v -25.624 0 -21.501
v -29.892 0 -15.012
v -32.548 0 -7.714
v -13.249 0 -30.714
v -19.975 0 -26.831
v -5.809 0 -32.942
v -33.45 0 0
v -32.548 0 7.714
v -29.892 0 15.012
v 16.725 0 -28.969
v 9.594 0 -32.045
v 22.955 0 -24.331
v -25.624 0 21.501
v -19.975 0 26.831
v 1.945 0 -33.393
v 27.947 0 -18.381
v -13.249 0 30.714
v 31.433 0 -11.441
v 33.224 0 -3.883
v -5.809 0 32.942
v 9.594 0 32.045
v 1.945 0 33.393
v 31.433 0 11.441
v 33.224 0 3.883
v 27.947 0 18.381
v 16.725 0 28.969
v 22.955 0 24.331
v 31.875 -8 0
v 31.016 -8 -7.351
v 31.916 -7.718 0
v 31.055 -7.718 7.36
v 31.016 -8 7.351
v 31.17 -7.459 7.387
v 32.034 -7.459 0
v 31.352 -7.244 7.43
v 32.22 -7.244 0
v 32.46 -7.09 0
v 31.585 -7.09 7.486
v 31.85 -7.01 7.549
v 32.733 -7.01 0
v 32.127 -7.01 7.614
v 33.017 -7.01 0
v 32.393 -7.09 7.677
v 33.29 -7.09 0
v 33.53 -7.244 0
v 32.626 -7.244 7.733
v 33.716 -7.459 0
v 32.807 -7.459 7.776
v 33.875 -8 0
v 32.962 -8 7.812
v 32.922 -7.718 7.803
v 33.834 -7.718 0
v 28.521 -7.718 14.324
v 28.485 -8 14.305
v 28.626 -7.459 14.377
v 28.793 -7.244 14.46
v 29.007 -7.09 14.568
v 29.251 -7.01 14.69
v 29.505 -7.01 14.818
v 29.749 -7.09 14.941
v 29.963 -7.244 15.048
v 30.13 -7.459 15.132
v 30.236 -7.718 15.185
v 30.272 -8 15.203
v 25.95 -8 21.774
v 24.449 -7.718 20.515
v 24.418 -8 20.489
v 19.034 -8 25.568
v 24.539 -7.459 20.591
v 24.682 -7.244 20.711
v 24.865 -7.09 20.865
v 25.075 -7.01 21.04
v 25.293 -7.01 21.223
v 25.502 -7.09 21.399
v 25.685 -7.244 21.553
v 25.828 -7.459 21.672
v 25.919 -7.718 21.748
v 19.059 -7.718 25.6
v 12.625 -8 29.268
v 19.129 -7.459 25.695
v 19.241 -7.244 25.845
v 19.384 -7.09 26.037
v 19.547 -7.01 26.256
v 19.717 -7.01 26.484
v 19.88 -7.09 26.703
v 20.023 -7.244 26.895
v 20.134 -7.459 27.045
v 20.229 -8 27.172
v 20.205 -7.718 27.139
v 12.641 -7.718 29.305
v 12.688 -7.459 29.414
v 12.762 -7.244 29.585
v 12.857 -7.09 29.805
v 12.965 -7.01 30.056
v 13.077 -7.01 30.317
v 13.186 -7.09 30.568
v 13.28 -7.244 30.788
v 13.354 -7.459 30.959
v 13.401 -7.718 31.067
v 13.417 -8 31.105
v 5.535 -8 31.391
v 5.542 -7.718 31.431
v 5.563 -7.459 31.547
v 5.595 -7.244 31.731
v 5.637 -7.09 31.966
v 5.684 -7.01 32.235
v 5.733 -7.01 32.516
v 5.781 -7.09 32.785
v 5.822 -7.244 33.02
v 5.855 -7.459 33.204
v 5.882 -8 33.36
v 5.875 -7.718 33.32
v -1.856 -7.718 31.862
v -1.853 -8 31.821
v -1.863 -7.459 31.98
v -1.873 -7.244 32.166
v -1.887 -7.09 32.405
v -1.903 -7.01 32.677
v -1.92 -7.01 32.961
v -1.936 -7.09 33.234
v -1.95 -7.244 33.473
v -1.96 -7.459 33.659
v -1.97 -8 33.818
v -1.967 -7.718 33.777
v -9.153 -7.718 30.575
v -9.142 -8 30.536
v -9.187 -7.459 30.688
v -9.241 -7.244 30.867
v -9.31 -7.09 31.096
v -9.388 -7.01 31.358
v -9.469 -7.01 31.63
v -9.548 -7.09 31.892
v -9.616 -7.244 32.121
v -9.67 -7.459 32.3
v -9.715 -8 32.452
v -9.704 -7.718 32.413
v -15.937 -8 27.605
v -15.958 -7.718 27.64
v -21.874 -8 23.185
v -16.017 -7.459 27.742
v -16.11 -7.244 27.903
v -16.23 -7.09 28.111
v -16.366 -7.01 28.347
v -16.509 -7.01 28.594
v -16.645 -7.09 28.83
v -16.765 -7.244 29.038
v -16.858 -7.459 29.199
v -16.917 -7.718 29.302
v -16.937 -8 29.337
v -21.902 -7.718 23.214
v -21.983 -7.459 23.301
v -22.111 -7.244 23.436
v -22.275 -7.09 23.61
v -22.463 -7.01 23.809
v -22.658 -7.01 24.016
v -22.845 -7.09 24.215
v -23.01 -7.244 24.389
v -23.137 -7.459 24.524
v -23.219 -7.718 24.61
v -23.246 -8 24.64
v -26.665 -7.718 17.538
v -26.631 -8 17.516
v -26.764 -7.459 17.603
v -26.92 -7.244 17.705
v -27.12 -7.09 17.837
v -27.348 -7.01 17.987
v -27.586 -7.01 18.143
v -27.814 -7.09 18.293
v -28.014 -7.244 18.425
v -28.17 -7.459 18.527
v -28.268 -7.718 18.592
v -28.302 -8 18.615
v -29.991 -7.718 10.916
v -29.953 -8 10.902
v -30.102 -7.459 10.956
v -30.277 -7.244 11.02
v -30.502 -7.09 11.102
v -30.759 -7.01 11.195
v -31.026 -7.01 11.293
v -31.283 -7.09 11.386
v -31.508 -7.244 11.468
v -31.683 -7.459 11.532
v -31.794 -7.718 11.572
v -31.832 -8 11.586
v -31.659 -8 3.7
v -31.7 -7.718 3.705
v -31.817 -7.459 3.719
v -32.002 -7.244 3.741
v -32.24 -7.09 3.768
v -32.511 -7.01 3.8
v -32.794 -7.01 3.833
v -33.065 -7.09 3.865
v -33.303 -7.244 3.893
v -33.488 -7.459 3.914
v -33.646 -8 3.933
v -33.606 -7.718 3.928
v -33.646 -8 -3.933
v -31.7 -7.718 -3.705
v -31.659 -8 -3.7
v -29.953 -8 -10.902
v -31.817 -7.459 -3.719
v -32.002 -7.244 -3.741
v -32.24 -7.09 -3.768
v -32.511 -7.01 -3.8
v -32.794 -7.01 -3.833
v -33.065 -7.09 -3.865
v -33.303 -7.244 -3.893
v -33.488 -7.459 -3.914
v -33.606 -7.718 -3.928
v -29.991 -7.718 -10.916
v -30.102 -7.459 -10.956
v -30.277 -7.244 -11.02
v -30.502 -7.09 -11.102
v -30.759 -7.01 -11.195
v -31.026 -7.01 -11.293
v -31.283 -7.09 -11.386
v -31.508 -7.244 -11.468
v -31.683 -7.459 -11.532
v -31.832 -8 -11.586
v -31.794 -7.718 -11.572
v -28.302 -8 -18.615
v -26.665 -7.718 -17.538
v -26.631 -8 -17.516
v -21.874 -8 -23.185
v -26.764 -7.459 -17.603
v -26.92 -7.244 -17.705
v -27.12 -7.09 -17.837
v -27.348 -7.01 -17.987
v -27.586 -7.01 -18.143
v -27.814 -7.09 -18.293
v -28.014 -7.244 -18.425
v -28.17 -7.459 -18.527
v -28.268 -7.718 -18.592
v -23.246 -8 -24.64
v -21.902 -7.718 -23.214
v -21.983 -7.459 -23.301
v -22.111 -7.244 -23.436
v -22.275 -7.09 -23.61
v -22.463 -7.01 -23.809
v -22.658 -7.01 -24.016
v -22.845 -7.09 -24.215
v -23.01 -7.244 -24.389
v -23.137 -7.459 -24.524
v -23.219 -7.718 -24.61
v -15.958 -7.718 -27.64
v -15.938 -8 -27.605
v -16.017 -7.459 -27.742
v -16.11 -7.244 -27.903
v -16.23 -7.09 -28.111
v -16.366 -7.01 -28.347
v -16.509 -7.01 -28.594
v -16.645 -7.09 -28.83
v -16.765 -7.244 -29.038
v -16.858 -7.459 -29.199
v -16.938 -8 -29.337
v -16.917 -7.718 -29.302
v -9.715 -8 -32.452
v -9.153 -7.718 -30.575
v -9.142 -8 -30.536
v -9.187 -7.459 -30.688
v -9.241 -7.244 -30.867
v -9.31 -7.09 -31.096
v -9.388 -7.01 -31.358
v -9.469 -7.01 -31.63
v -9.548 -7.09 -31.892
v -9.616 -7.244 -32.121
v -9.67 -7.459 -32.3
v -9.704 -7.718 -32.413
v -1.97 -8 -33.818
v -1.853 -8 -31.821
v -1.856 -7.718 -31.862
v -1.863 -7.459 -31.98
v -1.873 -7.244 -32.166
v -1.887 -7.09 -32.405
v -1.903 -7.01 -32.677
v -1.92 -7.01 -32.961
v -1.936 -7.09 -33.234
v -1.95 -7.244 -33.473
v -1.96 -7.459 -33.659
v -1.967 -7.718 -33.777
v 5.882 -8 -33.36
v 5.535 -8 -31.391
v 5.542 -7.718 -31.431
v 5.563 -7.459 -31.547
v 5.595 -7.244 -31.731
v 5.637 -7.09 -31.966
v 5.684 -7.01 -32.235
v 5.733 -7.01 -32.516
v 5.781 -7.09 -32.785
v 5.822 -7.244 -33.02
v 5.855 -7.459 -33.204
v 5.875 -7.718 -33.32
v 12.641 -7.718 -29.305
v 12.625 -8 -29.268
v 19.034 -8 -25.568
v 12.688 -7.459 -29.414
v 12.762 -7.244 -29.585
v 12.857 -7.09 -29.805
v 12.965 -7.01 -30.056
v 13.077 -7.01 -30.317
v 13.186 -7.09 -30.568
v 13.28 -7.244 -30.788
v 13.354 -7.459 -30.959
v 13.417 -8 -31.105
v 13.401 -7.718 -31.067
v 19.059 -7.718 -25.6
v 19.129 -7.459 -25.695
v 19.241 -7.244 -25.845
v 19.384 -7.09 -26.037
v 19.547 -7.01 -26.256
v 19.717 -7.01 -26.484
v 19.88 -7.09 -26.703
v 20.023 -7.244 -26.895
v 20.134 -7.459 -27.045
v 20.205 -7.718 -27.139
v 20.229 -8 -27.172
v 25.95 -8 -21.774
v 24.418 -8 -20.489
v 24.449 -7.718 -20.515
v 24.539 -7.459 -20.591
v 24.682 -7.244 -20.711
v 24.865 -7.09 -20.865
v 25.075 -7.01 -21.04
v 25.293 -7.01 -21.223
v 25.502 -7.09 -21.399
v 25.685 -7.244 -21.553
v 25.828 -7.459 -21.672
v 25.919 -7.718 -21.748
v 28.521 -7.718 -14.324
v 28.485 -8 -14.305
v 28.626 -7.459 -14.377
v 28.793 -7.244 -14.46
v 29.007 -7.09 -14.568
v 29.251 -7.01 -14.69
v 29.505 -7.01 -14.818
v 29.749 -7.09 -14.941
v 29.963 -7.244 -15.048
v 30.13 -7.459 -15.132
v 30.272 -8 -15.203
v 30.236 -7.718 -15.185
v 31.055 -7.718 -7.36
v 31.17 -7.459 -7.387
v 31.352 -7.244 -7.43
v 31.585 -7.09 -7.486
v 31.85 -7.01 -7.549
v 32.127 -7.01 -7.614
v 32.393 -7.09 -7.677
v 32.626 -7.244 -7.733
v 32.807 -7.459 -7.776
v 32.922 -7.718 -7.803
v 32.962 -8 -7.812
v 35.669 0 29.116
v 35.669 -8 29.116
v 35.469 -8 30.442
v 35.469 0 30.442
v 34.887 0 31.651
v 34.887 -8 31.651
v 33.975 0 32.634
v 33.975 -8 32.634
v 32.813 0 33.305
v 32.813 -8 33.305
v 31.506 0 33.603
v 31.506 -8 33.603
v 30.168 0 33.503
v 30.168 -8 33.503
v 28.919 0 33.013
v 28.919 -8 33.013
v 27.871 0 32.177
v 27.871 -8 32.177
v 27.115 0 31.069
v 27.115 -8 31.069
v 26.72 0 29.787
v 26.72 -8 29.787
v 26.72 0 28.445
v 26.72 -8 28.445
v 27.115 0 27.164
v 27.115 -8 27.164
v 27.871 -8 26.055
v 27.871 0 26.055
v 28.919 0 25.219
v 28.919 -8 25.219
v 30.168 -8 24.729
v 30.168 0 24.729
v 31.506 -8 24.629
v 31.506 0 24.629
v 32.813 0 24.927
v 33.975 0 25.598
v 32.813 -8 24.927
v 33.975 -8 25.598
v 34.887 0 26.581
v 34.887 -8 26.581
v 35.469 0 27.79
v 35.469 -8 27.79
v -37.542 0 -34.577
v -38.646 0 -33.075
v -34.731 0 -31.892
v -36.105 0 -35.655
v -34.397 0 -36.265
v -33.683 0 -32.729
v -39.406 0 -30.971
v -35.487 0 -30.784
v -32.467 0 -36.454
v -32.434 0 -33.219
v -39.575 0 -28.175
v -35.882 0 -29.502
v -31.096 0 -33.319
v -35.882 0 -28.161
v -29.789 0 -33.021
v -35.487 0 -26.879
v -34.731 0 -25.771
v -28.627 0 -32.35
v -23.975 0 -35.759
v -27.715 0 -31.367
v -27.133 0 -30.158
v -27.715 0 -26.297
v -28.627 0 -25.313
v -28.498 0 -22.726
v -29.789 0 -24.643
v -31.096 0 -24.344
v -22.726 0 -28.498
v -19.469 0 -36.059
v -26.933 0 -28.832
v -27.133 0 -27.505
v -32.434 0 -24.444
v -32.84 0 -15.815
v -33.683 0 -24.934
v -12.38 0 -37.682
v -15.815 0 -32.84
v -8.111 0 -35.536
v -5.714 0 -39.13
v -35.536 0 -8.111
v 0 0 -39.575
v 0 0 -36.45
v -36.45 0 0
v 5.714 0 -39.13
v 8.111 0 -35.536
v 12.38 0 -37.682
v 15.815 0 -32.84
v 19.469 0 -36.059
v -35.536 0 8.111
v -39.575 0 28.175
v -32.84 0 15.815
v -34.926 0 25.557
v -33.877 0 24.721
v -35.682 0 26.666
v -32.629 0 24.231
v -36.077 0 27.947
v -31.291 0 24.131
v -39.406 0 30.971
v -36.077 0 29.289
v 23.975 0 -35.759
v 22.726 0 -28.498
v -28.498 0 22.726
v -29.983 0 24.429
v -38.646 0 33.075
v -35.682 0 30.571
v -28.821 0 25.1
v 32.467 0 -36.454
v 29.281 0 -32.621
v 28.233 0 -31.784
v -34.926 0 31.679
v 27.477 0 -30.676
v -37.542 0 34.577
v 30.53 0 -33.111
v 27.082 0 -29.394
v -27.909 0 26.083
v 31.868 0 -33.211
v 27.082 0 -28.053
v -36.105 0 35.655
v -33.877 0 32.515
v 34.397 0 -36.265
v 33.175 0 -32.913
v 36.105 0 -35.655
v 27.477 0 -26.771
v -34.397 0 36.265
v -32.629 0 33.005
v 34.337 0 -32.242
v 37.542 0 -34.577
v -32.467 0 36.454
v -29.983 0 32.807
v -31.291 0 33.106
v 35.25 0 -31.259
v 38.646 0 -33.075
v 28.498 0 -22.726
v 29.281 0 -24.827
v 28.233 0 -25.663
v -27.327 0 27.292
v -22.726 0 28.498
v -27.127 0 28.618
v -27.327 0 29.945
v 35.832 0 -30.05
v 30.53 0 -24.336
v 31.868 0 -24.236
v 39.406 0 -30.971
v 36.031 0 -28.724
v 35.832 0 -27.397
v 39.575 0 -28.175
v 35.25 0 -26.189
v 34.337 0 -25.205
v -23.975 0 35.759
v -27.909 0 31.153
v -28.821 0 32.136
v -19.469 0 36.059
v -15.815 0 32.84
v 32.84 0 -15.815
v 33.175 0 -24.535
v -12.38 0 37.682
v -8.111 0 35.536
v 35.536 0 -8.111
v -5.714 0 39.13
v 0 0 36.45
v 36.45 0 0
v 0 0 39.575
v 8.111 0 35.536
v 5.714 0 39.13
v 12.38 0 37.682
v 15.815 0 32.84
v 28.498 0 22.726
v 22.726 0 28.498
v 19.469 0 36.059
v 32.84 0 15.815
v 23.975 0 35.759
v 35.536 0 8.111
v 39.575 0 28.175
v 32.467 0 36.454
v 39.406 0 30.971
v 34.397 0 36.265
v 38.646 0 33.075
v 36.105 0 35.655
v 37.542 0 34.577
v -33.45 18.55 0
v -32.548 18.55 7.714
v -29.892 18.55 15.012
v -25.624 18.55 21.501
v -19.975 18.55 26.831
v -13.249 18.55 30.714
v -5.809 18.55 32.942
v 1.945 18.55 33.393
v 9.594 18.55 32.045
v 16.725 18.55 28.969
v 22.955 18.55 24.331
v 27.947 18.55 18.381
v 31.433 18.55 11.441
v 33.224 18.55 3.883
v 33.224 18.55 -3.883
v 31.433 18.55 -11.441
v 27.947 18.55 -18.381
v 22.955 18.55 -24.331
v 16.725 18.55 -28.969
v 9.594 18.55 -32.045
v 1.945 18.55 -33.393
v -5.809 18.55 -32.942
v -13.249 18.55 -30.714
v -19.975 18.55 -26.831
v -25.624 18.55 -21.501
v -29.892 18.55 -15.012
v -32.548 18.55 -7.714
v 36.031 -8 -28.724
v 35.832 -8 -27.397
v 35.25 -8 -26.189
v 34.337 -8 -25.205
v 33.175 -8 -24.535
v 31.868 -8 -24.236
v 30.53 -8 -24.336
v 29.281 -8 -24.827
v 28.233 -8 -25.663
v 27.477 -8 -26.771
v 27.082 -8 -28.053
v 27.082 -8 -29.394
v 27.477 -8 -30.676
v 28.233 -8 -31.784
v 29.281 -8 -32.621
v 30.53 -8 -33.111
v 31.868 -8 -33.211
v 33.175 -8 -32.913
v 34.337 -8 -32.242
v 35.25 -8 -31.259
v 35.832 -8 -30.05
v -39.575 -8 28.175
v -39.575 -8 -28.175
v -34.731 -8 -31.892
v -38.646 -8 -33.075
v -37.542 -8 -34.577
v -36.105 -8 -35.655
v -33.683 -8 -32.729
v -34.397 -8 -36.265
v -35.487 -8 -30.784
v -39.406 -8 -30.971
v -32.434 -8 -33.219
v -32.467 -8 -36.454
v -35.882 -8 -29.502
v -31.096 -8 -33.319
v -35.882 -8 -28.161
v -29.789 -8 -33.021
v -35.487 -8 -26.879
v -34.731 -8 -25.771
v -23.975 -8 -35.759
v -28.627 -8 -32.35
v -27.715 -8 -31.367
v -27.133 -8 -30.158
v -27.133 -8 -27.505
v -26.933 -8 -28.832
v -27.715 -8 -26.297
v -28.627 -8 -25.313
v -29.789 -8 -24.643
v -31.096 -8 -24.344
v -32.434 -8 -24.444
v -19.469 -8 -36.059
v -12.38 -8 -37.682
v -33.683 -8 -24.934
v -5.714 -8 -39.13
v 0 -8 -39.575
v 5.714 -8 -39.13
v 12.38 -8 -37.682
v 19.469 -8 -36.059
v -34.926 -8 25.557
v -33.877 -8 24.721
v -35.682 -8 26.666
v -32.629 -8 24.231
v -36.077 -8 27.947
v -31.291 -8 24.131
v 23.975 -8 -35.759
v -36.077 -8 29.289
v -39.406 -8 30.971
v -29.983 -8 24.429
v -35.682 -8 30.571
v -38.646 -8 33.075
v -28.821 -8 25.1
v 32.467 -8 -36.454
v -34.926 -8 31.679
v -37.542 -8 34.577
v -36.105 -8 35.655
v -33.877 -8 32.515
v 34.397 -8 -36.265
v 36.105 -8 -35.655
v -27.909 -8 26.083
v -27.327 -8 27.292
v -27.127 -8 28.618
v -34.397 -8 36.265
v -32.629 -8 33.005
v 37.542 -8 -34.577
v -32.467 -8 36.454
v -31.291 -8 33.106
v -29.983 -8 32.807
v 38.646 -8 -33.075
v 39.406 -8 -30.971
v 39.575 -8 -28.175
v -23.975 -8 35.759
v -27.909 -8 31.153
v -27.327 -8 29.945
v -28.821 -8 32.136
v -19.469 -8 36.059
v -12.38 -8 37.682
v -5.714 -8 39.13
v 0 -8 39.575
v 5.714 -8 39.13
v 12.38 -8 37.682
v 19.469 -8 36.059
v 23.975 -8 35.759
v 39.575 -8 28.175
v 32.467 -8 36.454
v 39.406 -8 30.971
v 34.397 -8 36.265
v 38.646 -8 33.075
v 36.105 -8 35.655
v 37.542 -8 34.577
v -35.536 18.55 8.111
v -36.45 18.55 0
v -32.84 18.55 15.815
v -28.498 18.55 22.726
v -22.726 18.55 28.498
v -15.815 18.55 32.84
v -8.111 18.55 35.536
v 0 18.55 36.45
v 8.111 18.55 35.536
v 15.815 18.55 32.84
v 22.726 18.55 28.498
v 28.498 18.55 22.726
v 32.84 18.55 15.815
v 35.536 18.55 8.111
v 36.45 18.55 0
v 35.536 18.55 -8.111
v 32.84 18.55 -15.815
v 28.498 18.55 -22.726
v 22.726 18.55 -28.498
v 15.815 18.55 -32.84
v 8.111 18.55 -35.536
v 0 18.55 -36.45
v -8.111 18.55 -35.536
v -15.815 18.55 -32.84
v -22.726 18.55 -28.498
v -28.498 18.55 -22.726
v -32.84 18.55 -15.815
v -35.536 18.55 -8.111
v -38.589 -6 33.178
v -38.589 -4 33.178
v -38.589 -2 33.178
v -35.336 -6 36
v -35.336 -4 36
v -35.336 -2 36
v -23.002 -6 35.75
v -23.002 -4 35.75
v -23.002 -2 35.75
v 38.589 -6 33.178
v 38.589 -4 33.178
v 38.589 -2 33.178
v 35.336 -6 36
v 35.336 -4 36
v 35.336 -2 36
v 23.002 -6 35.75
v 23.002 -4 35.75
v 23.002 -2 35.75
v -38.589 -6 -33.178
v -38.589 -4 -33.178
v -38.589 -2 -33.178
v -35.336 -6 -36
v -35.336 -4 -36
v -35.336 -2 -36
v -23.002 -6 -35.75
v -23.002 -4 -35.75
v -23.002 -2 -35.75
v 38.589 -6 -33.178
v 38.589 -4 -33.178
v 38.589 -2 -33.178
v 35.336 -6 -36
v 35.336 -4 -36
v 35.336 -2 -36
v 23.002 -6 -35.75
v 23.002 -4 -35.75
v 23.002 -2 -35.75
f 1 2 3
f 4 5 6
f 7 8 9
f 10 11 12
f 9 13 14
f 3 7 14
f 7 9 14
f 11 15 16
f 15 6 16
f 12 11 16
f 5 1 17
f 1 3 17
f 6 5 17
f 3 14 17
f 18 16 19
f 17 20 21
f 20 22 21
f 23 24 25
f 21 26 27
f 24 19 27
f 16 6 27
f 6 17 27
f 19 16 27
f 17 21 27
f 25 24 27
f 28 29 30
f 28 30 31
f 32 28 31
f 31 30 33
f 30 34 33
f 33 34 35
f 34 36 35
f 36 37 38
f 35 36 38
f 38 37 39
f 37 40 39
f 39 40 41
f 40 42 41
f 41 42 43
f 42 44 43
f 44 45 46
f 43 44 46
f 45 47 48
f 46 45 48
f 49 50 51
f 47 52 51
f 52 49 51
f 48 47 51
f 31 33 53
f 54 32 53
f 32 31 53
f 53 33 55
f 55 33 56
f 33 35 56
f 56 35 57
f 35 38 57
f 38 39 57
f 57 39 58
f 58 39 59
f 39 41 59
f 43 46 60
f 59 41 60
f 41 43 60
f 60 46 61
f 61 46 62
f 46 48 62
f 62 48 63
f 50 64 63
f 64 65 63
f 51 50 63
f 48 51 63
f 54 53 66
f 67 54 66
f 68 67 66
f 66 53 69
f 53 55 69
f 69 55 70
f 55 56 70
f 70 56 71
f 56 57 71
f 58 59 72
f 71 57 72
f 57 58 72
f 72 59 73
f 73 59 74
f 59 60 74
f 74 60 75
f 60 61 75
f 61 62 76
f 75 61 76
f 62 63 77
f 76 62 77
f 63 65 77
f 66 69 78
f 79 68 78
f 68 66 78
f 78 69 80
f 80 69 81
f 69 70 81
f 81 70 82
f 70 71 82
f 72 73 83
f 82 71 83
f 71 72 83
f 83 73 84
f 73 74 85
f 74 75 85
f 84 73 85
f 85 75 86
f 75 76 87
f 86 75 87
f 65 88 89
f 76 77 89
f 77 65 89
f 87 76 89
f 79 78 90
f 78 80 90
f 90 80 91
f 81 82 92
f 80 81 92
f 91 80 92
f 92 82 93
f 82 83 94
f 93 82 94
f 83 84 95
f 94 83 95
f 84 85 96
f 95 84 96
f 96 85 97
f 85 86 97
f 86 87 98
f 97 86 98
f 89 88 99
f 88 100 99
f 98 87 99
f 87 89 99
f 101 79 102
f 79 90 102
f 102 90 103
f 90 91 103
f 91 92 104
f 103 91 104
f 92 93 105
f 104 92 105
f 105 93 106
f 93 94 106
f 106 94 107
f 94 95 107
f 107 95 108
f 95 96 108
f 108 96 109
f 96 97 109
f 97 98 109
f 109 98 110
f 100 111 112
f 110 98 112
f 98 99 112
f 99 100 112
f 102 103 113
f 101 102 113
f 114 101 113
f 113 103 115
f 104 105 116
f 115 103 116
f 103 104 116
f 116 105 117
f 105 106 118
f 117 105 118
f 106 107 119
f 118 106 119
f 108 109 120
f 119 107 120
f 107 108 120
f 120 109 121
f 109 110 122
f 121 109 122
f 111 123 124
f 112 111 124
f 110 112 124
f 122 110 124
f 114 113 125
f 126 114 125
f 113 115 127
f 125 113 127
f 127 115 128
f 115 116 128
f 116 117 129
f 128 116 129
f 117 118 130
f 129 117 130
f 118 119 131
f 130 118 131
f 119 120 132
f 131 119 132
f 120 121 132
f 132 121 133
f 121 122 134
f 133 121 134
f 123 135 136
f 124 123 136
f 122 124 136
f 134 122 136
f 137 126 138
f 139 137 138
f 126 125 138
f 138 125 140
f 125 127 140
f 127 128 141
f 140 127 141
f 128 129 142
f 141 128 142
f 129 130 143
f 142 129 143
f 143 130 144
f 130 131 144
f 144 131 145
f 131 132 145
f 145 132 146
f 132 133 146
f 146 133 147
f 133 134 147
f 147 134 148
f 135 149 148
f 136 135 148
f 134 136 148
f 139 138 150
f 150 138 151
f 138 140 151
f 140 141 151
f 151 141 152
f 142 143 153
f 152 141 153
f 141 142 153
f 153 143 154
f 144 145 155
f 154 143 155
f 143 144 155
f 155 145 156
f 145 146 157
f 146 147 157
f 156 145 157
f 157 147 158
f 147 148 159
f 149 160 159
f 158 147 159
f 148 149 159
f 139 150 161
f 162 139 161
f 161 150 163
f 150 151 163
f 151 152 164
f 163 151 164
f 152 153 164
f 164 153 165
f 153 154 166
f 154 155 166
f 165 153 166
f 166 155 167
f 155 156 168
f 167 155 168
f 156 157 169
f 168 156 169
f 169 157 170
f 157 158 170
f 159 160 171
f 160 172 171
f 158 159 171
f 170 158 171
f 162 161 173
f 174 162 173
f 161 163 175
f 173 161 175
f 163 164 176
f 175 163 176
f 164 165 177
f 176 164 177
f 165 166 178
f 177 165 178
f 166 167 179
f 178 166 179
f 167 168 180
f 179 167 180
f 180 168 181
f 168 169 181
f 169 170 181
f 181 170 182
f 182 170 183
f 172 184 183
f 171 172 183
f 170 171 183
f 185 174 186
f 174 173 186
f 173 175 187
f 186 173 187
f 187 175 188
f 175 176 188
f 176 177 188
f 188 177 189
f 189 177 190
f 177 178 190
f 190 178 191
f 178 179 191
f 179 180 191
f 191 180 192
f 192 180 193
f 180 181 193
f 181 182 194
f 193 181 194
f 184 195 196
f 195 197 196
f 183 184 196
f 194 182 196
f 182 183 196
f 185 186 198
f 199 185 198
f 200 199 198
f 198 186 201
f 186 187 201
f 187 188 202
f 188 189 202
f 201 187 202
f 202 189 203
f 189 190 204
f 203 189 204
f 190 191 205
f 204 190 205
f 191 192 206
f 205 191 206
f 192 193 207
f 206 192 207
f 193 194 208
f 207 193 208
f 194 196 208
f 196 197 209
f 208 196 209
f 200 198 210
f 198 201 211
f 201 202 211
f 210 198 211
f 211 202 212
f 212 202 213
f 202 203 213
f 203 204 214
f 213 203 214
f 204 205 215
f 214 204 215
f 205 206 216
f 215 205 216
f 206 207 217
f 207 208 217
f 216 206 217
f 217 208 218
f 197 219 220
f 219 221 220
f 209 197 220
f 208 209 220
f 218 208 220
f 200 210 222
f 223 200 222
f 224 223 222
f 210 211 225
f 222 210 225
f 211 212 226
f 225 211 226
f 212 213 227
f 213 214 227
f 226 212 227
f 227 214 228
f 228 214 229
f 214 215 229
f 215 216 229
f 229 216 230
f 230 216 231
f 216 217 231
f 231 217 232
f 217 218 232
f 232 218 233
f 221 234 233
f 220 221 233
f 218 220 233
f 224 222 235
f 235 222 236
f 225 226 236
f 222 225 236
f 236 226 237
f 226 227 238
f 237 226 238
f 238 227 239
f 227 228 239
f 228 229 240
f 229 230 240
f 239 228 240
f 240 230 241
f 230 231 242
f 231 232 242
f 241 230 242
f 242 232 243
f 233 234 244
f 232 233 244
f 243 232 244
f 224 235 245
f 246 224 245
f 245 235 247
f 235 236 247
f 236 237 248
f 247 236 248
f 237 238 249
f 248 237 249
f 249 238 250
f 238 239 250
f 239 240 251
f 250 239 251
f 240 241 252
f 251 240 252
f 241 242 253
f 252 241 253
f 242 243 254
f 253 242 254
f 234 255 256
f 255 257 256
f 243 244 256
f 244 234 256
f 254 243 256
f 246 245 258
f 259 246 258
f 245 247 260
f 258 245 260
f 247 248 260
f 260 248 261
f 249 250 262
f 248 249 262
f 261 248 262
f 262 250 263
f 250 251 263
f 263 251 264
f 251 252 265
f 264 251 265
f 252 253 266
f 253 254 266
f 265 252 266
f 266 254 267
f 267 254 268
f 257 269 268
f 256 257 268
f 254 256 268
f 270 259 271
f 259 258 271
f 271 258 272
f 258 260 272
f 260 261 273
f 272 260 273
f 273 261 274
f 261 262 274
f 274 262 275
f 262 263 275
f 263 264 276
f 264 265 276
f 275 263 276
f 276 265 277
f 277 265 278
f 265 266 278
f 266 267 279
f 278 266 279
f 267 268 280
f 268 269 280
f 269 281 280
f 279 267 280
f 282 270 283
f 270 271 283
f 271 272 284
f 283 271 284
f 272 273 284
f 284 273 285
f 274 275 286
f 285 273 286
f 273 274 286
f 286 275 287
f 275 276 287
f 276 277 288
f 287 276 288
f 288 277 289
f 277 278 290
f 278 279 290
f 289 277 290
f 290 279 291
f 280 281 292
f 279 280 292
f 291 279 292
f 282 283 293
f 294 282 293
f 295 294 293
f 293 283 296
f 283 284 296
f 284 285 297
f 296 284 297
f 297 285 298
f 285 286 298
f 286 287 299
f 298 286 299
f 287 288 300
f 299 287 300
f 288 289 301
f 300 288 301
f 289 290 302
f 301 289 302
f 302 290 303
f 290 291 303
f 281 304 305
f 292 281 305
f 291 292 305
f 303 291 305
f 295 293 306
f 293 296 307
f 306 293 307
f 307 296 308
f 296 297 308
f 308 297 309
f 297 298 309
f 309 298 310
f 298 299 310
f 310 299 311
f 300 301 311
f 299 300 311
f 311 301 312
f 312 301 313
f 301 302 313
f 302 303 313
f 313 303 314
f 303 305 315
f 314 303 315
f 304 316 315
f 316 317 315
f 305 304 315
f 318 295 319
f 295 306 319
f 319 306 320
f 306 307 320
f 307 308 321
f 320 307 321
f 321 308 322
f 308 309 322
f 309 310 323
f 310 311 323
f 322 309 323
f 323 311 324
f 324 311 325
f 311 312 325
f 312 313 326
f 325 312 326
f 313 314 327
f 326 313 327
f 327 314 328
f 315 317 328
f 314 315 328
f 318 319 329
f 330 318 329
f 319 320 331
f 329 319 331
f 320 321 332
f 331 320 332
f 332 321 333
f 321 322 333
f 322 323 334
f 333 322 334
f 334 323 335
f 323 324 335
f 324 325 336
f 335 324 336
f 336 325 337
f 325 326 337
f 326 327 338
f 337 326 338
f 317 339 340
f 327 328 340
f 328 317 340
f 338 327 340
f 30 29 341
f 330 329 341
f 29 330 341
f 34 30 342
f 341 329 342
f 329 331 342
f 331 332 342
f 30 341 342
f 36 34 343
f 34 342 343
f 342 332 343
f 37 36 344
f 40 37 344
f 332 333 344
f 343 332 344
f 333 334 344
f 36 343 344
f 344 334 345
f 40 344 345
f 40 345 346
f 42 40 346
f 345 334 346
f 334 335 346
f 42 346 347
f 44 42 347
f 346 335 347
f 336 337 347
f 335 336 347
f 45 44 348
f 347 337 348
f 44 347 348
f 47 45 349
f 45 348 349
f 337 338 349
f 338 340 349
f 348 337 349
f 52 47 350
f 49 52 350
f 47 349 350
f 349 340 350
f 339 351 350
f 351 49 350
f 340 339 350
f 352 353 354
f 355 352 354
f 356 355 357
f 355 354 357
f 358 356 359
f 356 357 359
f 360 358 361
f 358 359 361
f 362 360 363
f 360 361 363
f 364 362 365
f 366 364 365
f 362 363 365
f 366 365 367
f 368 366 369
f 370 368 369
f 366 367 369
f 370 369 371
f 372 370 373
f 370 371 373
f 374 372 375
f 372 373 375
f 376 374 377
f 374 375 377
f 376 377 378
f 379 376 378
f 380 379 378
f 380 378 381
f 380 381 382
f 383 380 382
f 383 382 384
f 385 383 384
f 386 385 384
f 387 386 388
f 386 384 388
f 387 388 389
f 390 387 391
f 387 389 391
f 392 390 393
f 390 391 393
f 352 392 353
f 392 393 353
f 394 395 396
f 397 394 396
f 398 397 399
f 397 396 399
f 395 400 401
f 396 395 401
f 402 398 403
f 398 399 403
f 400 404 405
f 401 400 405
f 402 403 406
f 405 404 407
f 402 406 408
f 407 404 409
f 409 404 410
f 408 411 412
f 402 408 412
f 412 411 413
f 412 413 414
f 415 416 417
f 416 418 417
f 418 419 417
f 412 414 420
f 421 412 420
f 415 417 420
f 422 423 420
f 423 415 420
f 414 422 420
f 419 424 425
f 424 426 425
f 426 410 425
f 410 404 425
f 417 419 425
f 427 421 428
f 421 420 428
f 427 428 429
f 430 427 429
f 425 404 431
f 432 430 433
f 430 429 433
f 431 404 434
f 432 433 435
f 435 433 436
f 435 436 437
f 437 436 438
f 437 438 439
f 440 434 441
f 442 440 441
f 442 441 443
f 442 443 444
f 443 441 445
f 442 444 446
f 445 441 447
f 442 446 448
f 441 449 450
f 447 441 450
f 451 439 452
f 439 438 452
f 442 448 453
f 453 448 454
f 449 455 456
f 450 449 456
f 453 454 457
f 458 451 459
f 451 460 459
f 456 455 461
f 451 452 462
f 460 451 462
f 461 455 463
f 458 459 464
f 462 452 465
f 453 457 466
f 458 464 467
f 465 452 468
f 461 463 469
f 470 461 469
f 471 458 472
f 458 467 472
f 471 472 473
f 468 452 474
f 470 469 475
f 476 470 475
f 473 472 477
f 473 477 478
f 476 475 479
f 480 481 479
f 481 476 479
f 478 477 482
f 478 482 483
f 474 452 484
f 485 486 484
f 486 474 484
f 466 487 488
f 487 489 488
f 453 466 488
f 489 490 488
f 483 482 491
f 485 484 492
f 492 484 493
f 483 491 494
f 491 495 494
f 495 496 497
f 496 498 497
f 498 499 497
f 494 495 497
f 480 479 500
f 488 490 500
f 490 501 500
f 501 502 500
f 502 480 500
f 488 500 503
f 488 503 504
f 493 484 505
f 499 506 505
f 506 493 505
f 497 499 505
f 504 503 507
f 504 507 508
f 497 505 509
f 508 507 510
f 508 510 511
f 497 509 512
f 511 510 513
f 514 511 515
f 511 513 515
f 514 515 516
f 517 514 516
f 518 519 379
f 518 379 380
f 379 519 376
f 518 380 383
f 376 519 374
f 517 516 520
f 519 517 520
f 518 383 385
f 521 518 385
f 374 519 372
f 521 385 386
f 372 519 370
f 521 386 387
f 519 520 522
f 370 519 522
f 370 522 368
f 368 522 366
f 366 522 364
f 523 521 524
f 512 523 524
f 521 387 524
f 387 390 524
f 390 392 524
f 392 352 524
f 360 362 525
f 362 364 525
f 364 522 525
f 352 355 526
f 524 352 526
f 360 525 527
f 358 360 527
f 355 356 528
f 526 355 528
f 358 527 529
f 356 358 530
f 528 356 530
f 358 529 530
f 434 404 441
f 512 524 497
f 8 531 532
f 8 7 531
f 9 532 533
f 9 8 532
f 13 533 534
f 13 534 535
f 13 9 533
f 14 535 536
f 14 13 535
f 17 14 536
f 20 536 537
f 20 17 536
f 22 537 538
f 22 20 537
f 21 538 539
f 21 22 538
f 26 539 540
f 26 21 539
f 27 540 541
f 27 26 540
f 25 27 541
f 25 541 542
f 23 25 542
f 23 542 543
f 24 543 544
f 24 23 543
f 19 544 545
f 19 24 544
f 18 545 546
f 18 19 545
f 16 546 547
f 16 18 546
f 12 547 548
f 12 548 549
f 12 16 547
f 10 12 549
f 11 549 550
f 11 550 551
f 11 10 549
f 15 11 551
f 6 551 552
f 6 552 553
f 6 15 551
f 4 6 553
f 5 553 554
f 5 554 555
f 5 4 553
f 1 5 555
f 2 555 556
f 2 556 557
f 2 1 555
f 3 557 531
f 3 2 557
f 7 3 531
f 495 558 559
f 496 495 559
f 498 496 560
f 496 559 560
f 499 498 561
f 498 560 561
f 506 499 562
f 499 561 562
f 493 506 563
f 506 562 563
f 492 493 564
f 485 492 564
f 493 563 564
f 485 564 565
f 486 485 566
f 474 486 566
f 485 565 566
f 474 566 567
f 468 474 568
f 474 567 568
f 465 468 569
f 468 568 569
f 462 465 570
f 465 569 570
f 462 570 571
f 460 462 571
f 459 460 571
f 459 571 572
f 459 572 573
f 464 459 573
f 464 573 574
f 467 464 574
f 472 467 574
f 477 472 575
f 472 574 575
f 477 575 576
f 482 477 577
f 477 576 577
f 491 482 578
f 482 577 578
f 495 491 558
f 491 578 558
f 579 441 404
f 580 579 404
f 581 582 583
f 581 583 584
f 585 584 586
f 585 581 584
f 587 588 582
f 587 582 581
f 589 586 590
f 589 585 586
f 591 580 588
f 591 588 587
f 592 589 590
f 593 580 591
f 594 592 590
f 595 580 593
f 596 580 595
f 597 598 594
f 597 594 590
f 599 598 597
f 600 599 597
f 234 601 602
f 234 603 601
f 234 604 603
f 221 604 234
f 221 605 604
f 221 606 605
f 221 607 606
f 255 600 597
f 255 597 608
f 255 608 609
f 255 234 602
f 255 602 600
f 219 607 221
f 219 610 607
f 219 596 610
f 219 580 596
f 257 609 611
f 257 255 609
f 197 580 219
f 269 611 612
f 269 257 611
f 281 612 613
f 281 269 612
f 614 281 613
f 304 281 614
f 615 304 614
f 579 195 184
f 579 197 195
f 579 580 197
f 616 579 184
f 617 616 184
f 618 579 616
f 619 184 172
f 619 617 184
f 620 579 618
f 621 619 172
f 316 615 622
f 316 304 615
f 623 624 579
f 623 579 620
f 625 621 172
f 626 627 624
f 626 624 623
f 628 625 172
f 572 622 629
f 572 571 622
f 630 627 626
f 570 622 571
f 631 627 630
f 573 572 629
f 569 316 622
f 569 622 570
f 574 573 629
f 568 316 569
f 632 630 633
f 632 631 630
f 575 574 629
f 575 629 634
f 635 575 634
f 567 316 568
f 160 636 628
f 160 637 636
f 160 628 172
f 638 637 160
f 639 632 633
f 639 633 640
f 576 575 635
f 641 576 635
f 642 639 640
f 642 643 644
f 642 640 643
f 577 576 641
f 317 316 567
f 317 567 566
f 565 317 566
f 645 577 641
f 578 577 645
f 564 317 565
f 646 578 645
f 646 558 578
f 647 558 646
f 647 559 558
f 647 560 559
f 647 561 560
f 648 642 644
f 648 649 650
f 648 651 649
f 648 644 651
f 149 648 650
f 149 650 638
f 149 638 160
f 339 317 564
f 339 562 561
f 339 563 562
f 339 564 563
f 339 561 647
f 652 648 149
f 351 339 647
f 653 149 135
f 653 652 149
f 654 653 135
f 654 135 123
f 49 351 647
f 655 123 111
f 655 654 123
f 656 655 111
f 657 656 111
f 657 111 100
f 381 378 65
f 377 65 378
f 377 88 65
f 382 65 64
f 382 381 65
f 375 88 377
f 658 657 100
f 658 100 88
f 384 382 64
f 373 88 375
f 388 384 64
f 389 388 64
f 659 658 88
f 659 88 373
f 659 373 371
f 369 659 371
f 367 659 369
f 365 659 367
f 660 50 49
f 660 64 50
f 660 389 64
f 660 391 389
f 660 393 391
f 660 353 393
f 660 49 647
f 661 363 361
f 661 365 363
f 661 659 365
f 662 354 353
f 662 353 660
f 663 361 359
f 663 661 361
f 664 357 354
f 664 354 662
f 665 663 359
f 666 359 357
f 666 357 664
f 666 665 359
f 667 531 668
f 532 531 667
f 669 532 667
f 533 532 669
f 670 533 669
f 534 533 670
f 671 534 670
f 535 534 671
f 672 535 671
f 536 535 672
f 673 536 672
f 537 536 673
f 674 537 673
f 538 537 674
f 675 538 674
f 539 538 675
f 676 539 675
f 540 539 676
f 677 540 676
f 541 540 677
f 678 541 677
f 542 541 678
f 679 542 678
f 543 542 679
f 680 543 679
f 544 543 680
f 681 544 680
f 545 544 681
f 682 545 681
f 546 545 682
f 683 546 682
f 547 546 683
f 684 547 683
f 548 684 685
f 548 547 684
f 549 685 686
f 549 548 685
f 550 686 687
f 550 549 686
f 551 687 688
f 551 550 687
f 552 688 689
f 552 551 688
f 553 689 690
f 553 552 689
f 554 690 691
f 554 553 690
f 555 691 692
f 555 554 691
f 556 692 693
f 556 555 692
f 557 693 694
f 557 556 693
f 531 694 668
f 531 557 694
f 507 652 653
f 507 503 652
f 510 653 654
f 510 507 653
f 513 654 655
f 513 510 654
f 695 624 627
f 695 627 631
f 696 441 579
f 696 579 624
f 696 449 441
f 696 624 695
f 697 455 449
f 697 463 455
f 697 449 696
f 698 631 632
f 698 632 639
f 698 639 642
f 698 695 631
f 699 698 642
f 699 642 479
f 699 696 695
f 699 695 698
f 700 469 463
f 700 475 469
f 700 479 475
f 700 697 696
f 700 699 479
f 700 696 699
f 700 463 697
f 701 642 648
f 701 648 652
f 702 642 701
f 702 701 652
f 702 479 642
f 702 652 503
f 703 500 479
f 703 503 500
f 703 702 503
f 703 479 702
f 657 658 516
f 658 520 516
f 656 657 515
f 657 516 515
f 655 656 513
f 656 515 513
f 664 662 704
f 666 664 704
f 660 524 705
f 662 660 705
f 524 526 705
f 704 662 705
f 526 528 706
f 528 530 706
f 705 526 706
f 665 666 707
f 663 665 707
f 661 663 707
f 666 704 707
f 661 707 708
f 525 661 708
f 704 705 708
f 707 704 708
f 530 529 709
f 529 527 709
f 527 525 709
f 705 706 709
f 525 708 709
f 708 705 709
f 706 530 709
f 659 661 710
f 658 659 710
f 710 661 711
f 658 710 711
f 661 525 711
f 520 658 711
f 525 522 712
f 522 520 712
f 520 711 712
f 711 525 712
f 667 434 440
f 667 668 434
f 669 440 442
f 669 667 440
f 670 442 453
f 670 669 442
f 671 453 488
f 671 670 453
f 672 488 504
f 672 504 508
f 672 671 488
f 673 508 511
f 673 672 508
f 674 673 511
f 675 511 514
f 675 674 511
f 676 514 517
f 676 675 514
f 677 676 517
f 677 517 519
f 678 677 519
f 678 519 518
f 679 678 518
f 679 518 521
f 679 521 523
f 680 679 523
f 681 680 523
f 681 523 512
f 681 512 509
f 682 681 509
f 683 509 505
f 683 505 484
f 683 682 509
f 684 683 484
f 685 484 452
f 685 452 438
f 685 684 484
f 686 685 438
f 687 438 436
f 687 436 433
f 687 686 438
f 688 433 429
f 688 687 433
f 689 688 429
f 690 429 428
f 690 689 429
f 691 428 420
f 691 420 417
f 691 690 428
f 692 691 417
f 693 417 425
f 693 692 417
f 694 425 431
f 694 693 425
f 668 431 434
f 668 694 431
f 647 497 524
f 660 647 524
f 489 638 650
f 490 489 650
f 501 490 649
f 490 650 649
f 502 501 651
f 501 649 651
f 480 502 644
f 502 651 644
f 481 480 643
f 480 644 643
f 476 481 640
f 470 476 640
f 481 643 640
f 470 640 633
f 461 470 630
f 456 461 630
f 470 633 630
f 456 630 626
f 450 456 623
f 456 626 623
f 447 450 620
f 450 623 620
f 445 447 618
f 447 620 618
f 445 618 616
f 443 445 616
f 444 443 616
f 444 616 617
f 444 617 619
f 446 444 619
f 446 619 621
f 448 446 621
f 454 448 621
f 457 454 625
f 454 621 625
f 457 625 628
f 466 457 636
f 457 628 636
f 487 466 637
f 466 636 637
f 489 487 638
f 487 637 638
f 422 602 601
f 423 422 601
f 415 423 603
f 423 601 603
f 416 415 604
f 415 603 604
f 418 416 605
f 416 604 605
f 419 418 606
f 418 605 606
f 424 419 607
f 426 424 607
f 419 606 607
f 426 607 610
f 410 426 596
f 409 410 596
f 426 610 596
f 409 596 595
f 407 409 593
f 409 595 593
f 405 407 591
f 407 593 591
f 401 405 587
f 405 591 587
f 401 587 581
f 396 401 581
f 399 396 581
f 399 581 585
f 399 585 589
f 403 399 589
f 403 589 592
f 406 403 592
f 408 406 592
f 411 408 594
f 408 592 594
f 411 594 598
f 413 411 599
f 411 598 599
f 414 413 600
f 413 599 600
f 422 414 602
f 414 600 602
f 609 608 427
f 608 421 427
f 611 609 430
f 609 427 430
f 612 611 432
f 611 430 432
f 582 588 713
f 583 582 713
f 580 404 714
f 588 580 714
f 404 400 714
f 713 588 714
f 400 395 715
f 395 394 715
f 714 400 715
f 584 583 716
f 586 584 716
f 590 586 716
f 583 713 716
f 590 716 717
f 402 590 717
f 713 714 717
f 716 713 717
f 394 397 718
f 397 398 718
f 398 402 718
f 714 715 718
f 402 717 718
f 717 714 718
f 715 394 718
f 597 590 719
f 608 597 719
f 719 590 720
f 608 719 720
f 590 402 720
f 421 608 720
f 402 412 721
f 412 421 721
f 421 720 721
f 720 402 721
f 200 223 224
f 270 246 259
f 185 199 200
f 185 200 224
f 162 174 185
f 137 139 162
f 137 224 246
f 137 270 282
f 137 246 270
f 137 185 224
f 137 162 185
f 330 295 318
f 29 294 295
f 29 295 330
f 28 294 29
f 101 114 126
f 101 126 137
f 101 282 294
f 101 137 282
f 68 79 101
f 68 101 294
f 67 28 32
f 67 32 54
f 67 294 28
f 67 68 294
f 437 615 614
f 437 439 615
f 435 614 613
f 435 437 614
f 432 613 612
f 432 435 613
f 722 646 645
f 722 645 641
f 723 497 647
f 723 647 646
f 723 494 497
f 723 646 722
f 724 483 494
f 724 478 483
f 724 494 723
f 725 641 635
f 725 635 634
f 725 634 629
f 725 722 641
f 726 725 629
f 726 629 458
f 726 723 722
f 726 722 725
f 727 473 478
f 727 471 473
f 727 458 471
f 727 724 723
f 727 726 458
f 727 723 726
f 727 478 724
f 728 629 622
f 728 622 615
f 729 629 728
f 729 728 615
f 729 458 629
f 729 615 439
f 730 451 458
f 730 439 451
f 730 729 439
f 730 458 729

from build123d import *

# Parameters (mm, degrees)
F1_DEPTH = 8
F2_R     = 4.5
F3_DEPTH = 8
F6_R     = 1
F8_W     = 3
F8_H     = 18.55


with BuildPart() as f1:
    # F0 (on Front) → F1 (new body)
    with BuildSketch(Plane.XZ):
        with BuildLine():
            Line((-39.575, 28.175), (-39.575, 0))
            Line((-39.575, 0), (-39.575, -28.175))
            add(Edge.make_bspline(
                [(-39.575, -28.175), (-39.8652448061, -32.0825006212), (-35.9525292205, -38.4365629841), (-22.6949341127, -34.0786260822), (-8.920869255, -39.156793634), (-2.73677378, -39.4421363997), (0, -39.575)],
                knots=[0, 0, 0, 0, 0.2247670207, 0.4893991001, 0.7773525509, 1, 1, 1, 1], degree=3))
            add(Edge.make_bspline(
                [(39.575, -28.175), (39.8652448061, -32.0825006212), (35.9525292205, -38.4365629841), (22.6949341127, -34.0786260822), (8.920869255, -39.156793634), (2.73677378, -39.4421363997), (0, -39.575)],
                knots=[0, 0, 0, 0, 0.2247670207, 0.4893991001, 0.7773525509, 1, 1, 1, 1], degree=3))
            Line((39.575, -28.175), (39.575, 0))
            Line((39.575, 0), (39.575, 28.175))
            add(Edge.make_bspline(
                [(39.575, 28.175), (39.8652448061, 32.0825006212), (35.9525292205, 38.4365629841), (22.6949341127, 34.0786260822), (8.920869255, 39.156793634), (2.73677378, 39.4421363997), (0, 39.575)],
                knots=[0, 0, 0, 0, 0.2247670207, 0.4893991001, 0.7773525509, 1, 1, 1, 1], degree=3))
            add(Edge.make_bspline(
                [(-39.575, 28.175), (-39.8652448061, 32.0825006212), (-35.9525292205, 38.4365629841), (-22.6949341127, 34.0786260822), (-8.920869255, 39.156793634), (-2.73677378, 39.4421363997), (0, 39.575)],
                knots=[0, 0, 0, 0, 0.2247670207, 0.4893991001, 0.7773525509, 1, 1, 1, 1], degree=3))
        make_face()
    extrude(amount=F1_DEPTH)

    # F2 (on face) → F3 (cut, through all)
    with BuildSketch(Plane.XZ.offset(8)):
        with Locations((-31.6271925499, 28.6181603254)):
            Circle(F2_R)
        with Locations((-31.4327607315, -28.8315792456)):
            Circle(F2_R)
        with Locations((31.5314427808, -28.7236231203)):
            Circle(F2_R)
        with Locations((31.1694185133, 29.1160738862)):
            Circle(F2_R)
    extrude(amount=-F3_DEPTH, mode=Mode.SUBTRACT)

    # F7: sweep along a path in F5
    with BuildLine(Plane.XZ.offset(8)) as f7_path:
        CenterArc((0, 0), 32.875, 0, 360)
    # F6 (on Top) → F7 (sweep, cut)
    with BuildSketch(Plane.XY):
        with Locations((32.875, -8)):
            Circle(F6_R)
    sweep(path=f7_path.line, mode=Mode.SUBTRACT)

    # F9: sweep along a path in F4
    with BuildLine(Plane(origin=(0, 0, 0), x_dir=(-1, 0, 0), z_dir=(0, 1, 0))) as f9_path:
        CenterArc((0, 0), 34.95, 0, 360)
    # F8 (on Top) → F9 (sweep)
    with BuildSketch(Plane.XY):
        with Locations((34.95, 9.275)):
            Rectangle(F8_W, F8_H)
    sweep(path=f9_path.line)


solid = f1.part
